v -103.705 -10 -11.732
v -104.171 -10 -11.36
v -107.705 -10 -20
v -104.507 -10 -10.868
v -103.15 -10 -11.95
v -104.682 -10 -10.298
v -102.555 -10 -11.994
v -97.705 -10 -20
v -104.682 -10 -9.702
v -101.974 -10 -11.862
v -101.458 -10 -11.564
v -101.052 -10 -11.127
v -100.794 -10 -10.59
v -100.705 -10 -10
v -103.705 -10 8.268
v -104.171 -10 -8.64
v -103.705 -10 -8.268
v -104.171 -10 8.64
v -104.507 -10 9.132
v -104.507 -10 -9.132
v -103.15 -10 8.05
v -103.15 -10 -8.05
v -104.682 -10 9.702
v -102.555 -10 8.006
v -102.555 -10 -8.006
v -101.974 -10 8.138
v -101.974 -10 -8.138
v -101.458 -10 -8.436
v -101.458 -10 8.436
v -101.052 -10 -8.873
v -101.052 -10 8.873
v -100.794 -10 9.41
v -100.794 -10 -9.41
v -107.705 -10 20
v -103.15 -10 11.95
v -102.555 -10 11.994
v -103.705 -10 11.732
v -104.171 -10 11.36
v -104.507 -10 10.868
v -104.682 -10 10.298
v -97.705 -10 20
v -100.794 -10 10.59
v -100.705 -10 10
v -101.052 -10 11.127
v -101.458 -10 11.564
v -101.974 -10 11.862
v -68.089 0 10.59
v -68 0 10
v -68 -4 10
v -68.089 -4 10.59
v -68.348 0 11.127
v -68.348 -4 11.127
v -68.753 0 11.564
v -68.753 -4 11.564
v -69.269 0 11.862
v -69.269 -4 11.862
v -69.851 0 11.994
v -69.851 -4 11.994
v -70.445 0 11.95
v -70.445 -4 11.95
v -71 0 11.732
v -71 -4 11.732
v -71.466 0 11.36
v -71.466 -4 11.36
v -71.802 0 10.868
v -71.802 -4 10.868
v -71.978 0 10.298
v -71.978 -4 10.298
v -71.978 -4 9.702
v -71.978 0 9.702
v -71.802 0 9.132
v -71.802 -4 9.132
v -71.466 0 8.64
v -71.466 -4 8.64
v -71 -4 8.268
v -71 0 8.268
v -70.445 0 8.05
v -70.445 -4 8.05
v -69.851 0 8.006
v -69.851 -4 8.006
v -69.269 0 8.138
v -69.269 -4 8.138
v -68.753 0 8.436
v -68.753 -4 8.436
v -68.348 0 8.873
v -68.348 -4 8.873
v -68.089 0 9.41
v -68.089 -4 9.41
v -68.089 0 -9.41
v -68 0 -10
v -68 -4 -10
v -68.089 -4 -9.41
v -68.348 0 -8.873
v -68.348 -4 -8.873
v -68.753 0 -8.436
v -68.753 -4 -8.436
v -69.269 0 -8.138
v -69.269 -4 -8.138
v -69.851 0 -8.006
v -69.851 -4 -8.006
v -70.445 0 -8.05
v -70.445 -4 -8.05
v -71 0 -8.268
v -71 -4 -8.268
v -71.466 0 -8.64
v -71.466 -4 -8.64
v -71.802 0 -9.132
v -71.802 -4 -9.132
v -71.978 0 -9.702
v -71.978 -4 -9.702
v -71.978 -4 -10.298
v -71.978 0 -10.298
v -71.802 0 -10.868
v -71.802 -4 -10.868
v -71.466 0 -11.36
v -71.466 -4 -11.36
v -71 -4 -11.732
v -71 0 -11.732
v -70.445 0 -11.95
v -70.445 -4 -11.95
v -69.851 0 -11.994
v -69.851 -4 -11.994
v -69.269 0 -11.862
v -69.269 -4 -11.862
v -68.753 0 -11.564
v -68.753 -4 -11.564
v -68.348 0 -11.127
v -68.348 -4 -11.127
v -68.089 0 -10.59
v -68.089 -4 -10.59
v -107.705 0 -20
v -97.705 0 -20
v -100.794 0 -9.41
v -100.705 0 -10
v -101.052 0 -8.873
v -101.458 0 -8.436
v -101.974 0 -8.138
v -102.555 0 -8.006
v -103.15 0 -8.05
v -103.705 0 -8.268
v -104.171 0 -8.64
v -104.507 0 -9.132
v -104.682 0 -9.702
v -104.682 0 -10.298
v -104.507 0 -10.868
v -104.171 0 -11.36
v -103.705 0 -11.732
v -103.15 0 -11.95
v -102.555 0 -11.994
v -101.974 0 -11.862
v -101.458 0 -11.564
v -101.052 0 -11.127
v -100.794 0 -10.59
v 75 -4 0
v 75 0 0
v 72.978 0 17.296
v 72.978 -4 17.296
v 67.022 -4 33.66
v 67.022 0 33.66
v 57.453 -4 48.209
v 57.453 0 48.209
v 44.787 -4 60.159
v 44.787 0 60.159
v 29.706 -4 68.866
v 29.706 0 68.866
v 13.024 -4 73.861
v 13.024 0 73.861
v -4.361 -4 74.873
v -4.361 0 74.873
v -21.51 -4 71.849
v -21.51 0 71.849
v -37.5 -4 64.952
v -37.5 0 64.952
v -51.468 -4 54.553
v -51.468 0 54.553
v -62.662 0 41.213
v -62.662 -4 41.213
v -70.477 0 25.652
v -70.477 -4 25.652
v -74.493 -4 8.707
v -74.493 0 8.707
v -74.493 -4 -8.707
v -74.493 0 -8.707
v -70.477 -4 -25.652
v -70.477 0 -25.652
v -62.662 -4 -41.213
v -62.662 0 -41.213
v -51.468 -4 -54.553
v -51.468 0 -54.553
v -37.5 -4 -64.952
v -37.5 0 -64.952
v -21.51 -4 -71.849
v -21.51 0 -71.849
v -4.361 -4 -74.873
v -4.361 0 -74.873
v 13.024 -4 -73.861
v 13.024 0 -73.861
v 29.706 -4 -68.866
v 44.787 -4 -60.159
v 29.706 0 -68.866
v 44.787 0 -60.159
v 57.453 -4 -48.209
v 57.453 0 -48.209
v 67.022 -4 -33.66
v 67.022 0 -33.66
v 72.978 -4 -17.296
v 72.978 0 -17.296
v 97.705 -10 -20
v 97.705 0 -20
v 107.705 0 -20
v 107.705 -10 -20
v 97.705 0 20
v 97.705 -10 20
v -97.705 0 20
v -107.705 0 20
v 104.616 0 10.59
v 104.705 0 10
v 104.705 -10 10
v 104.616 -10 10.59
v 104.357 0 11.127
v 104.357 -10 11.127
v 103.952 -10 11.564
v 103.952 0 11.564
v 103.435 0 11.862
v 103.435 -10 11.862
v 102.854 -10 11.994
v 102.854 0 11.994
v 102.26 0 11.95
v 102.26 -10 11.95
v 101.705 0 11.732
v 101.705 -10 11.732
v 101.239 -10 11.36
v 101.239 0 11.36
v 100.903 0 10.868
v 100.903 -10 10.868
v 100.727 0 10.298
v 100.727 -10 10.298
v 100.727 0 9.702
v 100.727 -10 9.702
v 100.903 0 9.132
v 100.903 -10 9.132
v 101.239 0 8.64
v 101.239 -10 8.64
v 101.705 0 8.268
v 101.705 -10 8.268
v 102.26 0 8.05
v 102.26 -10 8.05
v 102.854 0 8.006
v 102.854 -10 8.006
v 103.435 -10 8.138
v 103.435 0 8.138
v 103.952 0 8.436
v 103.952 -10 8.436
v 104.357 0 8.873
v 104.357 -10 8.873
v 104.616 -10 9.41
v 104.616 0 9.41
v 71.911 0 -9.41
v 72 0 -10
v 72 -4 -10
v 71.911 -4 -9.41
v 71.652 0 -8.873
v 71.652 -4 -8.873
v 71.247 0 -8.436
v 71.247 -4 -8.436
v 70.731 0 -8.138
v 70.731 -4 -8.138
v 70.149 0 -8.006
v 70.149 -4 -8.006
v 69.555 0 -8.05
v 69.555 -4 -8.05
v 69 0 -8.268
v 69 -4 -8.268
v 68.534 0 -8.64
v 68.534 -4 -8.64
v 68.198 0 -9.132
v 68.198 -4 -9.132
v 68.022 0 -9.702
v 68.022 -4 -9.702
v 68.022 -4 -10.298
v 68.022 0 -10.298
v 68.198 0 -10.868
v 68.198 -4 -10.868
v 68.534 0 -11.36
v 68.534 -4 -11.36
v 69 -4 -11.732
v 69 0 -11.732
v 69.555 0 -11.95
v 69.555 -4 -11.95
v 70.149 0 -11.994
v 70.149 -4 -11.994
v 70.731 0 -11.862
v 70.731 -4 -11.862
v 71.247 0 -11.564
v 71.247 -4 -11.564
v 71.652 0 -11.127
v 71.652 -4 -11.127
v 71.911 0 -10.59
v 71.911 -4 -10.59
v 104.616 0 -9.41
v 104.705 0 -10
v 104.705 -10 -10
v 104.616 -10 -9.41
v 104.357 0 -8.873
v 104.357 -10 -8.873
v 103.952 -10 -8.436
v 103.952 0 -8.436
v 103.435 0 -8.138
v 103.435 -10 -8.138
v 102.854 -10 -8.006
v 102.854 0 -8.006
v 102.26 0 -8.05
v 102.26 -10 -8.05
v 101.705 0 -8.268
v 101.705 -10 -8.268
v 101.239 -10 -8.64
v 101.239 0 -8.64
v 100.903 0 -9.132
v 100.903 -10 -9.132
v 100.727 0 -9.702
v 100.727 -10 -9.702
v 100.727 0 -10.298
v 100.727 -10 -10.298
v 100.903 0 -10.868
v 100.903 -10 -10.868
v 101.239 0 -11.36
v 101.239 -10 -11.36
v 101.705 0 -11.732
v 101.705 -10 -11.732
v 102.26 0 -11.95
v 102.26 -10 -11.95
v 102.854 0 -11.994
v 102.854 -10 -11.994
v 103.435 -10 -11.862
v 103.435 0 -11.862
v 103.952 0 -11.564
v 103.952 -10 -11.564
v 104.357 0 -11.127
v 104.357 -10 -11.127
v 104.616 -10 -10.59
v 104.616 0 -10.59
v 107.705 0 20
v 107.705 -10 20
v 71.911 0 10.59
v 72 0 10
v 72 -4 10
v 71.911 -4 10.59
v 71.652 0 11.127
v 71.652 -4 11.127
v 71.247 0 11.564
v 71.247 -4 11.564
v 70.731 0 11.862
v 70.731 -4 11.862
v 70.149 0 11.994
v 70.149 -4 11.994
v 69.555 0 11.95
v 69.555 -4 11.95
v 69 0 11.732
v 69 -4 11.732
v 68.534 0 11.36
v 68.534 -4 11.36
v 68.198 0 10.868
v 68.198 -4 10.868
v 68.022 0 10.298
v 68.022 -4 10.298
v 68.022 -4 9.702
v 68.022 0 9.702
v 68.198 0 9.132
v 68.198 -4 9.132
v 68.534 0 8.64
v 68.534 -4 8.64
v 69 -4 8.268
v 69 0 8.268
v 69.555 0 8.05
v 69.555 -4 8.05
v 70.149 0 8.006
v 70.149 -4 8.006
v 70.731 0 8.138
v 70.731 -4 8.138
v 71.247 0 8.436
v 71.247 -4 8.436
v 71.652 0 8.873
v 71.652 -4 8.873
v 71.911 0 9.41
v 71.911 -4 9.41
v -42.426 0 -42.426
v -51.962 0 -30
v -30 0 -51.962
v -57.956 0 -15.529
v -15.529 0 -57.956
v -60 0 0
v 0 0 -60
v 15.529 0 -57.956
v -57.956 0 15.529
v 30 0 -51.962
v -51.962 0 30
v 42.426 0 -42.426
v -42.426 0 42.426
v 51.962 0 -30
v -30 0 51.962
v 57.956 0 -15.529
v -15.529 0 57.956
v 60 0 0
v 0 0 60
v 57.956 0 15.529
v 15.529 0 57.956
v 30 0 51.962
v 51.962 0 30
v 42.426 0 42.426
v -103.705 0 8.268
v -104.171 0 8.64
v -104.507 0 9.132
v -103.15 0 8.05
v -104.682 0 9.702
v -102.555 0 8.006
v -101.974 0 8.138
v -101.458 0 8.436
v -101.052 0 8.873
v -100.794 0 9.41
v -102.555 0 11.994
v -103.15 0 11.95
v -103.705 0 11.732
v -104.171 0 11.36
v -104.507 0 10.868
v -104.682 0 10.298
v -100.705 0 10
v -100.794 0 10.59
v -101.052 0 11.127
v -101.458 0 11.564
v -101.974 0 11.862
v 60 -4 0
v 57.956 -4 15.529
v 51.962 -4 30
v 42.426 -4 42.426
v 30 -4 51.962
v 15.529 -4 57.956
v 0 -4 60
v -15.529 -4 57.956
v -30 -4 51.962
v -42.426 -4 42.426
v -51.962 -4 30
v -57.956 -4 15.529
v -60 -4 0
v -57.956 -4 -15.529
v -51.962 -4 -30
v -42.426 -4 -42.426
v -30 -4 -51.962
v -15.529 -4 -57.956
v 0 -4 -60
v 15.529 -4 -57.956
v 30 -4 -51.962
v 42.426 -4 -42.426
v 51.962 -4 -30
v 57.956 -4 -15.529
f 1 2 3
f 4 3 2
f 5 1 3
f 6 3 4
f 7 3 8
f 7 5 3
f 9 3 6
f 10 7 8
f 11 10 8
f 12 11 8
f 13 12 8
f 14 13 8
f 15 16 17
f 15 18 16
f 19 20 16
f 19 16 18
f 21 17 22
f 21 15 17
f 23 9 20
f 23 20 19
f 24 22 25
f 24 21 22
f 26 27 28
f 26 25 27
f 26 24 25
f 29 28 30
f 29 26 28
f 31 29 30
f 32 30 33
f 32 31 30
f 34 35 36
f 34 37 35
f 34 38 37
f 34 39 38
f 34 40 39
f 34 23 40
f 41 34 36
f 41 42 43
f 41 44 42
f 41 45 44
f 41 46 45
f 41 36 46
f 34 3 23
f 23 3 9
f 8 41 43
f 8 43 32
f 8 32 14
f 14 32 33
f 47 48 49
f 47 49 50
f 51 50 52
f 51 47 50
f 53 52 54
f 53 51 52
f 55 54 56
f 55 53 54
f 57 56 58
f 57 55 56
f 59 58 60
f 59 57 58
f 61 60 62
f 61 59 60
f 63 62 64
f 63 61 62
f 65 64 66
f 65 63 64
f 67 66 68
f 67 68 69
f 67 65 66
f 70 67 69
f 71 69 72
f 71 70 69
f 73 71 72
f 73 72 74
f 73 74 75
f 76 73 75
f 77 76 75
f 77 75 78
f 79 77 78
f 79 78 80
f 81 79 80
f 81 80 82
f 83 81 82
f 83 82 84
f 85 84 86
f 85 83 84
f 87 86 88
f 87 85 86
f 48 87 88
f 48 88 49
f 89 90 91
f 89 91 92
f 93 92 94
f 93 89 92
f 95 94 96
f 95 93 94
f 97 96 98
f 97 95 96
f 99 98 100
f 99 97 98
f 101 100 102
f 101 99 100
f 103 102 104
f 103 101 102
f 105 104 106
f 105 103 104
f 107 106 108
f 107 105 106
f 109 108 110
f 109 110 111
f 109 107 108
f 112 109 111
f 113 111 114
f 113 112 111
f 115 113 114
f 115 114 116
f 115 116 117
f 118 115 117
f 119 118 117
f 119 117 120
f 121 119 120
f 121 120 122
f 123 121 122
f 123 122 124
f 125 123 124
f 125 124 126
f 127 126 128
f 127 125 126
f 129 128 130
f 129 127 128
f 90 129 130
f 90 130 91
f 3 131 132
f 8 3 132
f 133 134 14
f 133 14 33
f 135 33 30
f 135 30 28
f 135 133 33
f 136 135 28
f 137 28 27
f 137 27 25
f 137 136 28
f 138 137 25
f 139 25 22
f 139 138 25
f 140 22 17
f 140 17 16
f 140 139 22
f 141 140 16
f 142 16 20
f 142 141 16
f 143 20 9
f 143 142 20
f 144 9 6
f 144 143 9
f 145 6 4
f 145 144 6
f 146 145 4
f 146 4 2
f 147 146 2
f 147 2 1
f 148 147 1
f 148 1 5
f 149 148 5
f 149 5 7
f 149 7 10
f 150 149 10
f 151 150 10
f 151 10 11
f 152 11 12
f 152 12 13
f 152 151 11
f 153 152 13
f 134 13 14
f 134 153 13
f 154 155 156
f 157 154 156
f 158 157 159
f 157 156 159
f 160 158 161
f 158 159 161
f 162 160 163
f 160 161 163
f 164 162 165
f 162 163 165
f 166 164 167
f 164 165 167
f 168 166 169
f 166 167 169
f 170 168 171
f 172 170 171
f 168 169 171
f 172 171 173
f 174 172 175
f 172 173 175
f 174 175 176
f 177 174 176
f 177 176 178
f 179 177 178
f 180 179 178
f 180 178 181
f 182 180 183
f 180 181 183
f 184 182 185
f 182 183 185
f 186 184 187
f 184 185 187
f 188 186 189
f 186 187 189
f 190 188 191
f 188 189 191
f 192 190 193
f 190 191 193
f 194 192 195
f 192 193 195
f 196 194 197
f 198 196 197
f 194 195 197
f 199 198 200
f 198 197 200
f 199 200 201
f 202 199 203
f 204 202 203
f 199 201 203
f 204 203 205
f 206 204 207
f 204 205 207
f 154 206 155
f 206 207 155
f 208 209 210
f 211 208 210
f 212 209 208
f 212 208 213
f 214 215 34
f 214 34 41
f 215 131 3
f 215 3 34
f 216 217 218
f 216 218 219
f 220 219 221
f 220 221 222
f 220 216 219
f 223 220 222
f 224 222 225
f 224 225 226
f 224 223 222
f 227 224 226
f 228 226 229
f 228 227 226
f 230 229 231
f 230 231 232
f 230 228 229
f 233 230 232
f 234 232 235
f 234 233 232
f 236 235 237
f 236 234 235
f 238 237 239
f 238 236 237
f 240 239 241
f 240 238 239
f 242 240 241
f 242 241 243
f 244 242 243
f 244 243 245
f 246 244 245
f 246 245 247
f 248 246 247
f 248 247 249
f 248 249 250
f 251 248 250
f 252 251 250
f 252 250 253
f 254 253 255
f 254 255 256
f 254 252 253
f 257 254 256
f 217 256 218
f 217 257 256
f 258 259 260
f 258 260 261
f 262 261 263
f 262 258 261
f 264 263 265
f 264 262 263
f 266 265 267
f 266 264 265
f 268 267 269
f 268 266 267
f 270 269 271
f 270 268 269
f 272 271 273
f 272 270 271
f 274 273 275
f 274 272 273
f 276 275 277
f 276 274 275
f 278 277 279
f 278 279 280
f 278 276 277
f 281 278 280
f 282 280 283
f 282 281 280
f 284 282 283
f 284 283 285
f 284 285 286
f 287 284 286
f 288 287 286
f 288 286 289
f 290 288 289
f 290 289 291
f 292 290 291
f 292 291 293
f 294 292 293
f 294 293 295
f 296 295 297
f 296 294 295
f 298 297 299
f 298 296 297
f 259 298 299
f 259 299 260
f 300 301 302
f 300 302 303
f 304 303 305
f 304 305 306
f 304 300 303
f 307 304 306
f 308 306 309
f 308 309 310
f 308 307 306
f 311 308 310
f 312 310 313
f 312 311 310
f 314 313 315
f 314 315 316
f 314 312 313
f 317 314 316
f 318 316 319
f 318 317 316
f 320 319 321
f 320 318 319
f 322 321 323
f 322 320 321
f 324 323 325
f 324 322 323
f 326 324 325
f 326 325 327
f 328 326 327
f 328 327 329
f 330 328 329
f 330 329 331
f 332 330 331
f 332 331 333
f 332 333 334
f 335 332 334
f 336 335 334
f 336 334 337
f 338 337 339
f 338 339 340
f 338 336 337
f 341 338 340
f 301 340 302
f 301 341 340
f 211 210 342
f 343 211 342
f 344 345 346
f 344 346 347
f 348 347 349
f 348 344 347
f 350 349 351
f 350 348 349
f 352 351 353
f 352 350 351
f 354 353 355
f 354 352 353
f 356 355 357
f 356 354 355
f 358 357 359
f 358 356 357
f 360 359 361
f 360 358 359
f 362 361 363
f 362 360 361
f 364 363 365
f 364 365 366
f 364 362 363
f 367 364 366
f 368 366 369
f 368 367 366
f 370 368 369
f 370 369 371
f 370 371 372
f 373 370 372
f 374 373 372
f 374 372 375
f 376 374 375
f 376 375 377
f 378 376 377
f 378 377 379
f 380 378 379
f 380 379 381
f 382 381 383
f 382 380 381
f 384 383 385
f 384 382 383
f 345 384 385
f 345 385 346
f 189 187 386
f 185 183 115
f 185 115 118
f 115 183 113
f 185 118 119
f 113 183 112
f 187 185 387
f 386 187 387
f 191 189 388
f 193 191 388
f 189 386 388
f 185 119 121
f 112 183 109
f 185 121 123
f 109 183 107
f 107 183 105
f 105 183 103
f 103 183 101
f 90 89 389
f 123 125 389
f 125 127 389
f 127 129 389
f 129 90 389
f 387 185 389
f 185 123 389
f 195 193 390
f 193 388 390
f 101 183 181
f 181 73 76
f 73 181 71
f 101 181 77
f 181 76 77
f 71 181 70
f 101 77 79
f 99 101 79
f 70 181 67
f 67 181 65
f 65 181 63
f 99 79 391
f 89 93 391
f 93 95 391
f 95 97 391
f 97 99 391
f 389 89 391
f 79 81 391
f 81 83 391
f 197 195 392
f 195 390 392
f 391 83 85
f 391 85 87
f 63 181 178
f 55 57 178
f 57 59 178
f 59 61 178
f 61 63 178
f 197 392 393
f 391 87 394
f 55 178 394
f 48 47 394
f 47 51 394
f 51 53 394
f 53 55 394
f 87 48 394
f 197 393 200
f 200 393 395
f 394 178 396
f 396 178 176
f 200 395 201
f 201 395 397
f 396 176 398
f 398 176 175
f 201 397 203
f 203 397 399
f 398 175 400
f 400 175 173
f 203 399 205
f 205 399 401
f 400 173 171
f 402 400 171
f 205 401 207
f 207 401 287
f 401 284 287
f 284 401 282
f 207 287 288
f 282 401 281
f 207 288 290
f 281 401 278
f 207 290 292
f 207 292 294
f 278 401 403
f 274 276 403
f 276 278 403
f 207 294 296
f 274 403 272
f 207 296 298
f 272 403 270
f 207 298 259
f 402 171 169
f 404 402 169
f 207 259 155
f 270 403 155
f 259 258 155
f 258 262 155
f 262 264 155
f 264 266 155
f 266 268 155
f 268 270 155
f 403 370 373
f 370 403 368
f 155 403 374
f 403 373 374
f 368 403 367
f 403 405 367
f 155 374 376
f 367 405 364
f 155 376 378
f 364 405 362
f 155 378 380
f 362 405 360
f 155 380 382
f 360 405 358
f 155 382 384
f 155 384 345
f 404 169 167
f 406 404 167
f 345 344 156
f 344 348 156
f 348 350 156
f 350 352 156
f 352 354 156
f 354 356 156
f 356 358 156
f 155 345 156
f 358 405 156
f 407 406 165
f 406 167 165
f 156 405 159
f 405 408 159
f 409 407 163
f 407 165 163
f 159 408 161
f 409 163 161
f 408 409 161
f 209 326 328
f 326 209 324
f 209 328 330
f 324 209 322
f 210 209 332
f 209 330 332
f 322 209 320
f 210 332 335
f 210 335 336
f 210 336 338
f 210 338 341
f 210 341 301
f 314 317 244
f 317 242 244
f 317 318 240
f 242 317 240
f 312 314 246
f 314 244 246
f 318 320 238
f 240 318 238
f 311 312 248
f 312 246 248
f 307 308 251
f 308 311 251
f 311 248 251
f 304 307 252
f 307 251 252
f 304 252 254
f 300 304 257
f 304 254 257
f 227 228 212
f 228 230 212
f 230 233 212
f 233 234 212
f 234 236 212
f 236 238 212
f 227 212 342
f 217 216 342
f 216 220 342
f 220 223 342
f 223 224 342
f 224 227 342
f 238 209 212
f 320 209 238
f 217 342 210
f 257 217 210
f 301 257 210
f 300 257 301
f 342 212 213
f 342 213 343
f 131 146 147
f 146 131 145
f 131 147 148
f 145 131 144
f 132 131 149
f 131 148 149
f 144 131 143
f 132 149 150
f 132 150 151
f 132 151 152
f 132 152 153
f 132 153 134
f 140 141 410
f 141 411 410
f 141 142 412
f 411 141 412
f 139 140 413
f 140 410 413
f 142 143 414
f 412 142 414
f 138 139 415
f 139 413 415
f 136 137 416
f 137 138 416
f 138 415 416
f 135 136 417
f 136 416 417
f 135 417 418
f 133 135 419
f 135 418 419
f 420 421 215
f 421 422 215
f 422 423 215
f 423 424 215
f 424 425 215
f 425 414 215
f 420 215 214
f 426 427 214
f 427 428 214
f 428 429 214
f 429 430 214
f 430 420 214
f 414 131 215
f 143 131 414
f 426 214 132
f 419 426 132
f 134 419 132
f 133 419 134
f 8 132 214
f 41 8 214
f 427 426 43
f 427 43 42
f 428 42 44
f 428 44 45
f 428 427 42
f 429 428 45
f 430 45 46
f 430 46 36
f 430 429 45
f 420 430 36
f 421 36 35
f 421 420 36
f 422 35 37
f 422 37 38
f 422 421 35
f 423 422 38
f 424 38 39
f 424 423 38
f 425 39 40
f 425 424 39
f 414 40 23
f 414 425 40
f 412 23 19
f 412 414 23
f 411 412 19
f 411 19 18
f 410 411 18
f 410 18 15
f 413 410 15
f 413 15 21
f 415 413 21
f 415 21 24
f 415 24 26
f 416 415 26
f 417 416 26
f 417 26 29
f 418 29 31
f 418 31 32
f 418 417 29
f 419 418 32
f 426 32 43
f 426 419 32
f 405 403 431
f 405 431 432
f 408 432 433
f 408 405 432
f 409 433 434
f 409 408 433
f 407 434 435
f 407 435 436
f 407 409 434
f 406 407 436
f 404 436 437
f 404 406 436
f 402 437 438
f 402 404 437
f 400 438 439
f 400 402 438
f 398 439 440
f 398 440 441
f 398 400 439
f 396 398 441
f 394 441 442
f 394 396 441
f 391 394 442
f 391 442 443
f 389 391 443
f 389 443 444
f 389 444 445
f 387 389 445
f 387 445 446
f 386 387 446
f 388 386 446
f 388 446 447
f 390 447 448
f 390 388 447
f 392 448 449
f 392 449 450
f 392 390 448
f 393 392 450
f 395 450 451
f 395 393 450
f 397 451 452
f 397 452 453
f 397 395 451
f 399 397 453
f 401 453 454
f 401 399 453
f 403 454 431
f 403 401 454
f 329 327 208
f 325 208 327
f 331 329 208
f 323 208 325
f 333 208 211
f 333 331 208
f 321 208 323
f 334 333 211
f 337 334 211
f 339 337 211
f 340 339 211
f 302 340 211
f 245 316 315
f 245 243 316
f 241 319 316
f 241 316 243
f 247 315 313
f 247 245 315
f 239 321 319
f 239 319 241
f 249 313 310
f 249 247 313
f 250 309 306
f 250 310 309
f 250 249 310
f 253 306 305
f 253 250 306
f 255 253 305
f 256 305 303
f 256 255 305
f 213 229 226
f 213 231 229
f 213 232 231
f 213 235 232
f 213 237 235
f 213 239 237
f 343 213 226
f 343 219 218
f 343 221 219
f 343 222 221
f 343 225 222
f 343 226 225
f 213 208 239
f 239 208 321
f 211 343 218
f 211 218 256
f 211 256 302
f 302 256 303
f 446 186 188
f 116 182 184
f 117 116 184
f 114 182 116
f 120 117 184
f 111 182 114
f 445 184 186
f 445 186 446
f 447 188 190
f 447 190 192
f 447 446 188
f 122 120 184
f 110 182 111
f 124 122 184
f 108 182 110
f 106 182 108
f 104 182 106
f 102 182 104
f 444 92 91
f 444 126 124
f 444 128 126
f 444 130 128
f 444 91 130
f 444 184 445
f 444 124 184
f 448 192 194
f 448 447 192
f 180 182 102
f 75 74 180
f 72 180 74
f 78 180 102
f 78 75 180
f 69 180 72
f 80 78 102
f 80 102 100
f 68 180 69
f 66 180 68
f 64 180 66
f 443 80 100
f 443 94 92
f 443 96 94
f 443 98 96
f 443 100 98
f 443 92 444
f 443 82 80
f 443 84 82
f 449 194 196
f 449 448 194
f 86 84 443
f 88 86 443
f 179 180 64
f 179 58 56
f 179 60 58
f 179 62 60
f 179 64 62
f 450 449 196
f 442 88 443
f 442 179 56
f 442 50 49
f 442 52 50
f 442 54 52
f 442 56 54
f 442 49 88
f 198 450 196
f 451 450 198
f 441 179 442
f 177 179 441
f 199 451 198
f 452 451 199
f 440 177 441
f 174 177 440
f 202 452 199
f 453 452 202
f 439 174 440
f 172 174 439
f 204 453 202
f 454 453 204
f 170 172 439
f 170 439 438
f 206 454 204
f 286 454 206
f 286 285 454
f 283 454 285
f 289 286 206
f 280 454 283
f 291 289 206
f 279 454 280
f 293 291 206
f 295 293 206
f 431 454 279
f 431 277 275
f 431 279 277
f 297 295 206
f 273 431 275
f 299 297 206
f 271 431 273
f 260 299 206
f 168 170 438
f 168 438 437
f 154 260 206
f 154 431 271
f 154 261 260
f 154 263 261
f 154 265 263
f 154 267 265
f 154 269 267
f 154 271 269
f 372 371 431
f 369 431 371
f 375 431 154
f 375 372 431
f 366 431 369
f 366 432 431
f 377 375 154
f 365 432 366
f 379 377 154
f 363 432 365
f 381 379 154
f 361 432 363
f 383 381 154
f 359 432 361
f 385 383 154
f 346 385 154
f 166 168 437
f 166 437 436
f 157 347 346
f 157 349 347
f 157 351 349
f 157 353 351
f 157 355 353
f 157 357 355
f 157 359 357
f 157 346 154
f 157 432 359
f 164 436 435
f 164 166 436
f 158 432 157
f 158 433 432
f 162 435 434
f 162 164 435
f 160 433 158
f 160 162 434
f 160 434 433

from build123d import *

# Parameters (mm, degrees)
F0_R     = 75
F0_R_2   = 2
F0_R_3   = 60
F1_DEPTH = 4
F2_W     = 10
F2_H     = 40
F2_R     = 2
F3_DEPTH = 10


with BuildPart() as f1:
    # F0 (on Front) → F1 (new body)
    with BuildSketch(Plane.XZ):
        Circle(F0_R)
        with Locations((-70, -10)):
            Circle(F0_R_2, mode=Mode.SUBTRACT)
        with Locations((70, -10)):
            Circle(F0_R_2, mode=Mode.SUBTRACT)
        with Locations((-70, 10)):
            Circle(F0_R_2, mode=Mode.SUBTRACT)
        Circle(F0_R_3, mode=Mode.SUBTRACT)
        with Locations((70, 10)):
            Circle(F0_R_2, mode=Mode.SUBTRACT)
    extrude(amount=F1_DEPTH)


with BuildPart() as f3:
    # F2 (on Front) → F3 (new body)
    with BuildSketch(Plane.XZ):
        with Locations((-102.704708, 0)):
            Rectangle(F2_W, F2_H)
        with Locations((-102.704708, -10)):
            Circle(F2_R, mode=Mode.SUBTRACT)
        with Locations((-102.704708, 10)):
            Circle(F2_R, mode=Mode.SUBTRACT)
        with Locations((102.704708, 0)):
            Rectangle(F2_W, F2_H)
        with Locations((102.704708, -10)):
            Circle(F2_R, mode=Mode.SUBTRACT)
        with Locations((102.704708, 10)):
            Circle(F2_R, mode=Mode.SUBTRACT)
    extrude(amount=F3_DEPTH)


solid = Compound([f1.part, f3.part])
